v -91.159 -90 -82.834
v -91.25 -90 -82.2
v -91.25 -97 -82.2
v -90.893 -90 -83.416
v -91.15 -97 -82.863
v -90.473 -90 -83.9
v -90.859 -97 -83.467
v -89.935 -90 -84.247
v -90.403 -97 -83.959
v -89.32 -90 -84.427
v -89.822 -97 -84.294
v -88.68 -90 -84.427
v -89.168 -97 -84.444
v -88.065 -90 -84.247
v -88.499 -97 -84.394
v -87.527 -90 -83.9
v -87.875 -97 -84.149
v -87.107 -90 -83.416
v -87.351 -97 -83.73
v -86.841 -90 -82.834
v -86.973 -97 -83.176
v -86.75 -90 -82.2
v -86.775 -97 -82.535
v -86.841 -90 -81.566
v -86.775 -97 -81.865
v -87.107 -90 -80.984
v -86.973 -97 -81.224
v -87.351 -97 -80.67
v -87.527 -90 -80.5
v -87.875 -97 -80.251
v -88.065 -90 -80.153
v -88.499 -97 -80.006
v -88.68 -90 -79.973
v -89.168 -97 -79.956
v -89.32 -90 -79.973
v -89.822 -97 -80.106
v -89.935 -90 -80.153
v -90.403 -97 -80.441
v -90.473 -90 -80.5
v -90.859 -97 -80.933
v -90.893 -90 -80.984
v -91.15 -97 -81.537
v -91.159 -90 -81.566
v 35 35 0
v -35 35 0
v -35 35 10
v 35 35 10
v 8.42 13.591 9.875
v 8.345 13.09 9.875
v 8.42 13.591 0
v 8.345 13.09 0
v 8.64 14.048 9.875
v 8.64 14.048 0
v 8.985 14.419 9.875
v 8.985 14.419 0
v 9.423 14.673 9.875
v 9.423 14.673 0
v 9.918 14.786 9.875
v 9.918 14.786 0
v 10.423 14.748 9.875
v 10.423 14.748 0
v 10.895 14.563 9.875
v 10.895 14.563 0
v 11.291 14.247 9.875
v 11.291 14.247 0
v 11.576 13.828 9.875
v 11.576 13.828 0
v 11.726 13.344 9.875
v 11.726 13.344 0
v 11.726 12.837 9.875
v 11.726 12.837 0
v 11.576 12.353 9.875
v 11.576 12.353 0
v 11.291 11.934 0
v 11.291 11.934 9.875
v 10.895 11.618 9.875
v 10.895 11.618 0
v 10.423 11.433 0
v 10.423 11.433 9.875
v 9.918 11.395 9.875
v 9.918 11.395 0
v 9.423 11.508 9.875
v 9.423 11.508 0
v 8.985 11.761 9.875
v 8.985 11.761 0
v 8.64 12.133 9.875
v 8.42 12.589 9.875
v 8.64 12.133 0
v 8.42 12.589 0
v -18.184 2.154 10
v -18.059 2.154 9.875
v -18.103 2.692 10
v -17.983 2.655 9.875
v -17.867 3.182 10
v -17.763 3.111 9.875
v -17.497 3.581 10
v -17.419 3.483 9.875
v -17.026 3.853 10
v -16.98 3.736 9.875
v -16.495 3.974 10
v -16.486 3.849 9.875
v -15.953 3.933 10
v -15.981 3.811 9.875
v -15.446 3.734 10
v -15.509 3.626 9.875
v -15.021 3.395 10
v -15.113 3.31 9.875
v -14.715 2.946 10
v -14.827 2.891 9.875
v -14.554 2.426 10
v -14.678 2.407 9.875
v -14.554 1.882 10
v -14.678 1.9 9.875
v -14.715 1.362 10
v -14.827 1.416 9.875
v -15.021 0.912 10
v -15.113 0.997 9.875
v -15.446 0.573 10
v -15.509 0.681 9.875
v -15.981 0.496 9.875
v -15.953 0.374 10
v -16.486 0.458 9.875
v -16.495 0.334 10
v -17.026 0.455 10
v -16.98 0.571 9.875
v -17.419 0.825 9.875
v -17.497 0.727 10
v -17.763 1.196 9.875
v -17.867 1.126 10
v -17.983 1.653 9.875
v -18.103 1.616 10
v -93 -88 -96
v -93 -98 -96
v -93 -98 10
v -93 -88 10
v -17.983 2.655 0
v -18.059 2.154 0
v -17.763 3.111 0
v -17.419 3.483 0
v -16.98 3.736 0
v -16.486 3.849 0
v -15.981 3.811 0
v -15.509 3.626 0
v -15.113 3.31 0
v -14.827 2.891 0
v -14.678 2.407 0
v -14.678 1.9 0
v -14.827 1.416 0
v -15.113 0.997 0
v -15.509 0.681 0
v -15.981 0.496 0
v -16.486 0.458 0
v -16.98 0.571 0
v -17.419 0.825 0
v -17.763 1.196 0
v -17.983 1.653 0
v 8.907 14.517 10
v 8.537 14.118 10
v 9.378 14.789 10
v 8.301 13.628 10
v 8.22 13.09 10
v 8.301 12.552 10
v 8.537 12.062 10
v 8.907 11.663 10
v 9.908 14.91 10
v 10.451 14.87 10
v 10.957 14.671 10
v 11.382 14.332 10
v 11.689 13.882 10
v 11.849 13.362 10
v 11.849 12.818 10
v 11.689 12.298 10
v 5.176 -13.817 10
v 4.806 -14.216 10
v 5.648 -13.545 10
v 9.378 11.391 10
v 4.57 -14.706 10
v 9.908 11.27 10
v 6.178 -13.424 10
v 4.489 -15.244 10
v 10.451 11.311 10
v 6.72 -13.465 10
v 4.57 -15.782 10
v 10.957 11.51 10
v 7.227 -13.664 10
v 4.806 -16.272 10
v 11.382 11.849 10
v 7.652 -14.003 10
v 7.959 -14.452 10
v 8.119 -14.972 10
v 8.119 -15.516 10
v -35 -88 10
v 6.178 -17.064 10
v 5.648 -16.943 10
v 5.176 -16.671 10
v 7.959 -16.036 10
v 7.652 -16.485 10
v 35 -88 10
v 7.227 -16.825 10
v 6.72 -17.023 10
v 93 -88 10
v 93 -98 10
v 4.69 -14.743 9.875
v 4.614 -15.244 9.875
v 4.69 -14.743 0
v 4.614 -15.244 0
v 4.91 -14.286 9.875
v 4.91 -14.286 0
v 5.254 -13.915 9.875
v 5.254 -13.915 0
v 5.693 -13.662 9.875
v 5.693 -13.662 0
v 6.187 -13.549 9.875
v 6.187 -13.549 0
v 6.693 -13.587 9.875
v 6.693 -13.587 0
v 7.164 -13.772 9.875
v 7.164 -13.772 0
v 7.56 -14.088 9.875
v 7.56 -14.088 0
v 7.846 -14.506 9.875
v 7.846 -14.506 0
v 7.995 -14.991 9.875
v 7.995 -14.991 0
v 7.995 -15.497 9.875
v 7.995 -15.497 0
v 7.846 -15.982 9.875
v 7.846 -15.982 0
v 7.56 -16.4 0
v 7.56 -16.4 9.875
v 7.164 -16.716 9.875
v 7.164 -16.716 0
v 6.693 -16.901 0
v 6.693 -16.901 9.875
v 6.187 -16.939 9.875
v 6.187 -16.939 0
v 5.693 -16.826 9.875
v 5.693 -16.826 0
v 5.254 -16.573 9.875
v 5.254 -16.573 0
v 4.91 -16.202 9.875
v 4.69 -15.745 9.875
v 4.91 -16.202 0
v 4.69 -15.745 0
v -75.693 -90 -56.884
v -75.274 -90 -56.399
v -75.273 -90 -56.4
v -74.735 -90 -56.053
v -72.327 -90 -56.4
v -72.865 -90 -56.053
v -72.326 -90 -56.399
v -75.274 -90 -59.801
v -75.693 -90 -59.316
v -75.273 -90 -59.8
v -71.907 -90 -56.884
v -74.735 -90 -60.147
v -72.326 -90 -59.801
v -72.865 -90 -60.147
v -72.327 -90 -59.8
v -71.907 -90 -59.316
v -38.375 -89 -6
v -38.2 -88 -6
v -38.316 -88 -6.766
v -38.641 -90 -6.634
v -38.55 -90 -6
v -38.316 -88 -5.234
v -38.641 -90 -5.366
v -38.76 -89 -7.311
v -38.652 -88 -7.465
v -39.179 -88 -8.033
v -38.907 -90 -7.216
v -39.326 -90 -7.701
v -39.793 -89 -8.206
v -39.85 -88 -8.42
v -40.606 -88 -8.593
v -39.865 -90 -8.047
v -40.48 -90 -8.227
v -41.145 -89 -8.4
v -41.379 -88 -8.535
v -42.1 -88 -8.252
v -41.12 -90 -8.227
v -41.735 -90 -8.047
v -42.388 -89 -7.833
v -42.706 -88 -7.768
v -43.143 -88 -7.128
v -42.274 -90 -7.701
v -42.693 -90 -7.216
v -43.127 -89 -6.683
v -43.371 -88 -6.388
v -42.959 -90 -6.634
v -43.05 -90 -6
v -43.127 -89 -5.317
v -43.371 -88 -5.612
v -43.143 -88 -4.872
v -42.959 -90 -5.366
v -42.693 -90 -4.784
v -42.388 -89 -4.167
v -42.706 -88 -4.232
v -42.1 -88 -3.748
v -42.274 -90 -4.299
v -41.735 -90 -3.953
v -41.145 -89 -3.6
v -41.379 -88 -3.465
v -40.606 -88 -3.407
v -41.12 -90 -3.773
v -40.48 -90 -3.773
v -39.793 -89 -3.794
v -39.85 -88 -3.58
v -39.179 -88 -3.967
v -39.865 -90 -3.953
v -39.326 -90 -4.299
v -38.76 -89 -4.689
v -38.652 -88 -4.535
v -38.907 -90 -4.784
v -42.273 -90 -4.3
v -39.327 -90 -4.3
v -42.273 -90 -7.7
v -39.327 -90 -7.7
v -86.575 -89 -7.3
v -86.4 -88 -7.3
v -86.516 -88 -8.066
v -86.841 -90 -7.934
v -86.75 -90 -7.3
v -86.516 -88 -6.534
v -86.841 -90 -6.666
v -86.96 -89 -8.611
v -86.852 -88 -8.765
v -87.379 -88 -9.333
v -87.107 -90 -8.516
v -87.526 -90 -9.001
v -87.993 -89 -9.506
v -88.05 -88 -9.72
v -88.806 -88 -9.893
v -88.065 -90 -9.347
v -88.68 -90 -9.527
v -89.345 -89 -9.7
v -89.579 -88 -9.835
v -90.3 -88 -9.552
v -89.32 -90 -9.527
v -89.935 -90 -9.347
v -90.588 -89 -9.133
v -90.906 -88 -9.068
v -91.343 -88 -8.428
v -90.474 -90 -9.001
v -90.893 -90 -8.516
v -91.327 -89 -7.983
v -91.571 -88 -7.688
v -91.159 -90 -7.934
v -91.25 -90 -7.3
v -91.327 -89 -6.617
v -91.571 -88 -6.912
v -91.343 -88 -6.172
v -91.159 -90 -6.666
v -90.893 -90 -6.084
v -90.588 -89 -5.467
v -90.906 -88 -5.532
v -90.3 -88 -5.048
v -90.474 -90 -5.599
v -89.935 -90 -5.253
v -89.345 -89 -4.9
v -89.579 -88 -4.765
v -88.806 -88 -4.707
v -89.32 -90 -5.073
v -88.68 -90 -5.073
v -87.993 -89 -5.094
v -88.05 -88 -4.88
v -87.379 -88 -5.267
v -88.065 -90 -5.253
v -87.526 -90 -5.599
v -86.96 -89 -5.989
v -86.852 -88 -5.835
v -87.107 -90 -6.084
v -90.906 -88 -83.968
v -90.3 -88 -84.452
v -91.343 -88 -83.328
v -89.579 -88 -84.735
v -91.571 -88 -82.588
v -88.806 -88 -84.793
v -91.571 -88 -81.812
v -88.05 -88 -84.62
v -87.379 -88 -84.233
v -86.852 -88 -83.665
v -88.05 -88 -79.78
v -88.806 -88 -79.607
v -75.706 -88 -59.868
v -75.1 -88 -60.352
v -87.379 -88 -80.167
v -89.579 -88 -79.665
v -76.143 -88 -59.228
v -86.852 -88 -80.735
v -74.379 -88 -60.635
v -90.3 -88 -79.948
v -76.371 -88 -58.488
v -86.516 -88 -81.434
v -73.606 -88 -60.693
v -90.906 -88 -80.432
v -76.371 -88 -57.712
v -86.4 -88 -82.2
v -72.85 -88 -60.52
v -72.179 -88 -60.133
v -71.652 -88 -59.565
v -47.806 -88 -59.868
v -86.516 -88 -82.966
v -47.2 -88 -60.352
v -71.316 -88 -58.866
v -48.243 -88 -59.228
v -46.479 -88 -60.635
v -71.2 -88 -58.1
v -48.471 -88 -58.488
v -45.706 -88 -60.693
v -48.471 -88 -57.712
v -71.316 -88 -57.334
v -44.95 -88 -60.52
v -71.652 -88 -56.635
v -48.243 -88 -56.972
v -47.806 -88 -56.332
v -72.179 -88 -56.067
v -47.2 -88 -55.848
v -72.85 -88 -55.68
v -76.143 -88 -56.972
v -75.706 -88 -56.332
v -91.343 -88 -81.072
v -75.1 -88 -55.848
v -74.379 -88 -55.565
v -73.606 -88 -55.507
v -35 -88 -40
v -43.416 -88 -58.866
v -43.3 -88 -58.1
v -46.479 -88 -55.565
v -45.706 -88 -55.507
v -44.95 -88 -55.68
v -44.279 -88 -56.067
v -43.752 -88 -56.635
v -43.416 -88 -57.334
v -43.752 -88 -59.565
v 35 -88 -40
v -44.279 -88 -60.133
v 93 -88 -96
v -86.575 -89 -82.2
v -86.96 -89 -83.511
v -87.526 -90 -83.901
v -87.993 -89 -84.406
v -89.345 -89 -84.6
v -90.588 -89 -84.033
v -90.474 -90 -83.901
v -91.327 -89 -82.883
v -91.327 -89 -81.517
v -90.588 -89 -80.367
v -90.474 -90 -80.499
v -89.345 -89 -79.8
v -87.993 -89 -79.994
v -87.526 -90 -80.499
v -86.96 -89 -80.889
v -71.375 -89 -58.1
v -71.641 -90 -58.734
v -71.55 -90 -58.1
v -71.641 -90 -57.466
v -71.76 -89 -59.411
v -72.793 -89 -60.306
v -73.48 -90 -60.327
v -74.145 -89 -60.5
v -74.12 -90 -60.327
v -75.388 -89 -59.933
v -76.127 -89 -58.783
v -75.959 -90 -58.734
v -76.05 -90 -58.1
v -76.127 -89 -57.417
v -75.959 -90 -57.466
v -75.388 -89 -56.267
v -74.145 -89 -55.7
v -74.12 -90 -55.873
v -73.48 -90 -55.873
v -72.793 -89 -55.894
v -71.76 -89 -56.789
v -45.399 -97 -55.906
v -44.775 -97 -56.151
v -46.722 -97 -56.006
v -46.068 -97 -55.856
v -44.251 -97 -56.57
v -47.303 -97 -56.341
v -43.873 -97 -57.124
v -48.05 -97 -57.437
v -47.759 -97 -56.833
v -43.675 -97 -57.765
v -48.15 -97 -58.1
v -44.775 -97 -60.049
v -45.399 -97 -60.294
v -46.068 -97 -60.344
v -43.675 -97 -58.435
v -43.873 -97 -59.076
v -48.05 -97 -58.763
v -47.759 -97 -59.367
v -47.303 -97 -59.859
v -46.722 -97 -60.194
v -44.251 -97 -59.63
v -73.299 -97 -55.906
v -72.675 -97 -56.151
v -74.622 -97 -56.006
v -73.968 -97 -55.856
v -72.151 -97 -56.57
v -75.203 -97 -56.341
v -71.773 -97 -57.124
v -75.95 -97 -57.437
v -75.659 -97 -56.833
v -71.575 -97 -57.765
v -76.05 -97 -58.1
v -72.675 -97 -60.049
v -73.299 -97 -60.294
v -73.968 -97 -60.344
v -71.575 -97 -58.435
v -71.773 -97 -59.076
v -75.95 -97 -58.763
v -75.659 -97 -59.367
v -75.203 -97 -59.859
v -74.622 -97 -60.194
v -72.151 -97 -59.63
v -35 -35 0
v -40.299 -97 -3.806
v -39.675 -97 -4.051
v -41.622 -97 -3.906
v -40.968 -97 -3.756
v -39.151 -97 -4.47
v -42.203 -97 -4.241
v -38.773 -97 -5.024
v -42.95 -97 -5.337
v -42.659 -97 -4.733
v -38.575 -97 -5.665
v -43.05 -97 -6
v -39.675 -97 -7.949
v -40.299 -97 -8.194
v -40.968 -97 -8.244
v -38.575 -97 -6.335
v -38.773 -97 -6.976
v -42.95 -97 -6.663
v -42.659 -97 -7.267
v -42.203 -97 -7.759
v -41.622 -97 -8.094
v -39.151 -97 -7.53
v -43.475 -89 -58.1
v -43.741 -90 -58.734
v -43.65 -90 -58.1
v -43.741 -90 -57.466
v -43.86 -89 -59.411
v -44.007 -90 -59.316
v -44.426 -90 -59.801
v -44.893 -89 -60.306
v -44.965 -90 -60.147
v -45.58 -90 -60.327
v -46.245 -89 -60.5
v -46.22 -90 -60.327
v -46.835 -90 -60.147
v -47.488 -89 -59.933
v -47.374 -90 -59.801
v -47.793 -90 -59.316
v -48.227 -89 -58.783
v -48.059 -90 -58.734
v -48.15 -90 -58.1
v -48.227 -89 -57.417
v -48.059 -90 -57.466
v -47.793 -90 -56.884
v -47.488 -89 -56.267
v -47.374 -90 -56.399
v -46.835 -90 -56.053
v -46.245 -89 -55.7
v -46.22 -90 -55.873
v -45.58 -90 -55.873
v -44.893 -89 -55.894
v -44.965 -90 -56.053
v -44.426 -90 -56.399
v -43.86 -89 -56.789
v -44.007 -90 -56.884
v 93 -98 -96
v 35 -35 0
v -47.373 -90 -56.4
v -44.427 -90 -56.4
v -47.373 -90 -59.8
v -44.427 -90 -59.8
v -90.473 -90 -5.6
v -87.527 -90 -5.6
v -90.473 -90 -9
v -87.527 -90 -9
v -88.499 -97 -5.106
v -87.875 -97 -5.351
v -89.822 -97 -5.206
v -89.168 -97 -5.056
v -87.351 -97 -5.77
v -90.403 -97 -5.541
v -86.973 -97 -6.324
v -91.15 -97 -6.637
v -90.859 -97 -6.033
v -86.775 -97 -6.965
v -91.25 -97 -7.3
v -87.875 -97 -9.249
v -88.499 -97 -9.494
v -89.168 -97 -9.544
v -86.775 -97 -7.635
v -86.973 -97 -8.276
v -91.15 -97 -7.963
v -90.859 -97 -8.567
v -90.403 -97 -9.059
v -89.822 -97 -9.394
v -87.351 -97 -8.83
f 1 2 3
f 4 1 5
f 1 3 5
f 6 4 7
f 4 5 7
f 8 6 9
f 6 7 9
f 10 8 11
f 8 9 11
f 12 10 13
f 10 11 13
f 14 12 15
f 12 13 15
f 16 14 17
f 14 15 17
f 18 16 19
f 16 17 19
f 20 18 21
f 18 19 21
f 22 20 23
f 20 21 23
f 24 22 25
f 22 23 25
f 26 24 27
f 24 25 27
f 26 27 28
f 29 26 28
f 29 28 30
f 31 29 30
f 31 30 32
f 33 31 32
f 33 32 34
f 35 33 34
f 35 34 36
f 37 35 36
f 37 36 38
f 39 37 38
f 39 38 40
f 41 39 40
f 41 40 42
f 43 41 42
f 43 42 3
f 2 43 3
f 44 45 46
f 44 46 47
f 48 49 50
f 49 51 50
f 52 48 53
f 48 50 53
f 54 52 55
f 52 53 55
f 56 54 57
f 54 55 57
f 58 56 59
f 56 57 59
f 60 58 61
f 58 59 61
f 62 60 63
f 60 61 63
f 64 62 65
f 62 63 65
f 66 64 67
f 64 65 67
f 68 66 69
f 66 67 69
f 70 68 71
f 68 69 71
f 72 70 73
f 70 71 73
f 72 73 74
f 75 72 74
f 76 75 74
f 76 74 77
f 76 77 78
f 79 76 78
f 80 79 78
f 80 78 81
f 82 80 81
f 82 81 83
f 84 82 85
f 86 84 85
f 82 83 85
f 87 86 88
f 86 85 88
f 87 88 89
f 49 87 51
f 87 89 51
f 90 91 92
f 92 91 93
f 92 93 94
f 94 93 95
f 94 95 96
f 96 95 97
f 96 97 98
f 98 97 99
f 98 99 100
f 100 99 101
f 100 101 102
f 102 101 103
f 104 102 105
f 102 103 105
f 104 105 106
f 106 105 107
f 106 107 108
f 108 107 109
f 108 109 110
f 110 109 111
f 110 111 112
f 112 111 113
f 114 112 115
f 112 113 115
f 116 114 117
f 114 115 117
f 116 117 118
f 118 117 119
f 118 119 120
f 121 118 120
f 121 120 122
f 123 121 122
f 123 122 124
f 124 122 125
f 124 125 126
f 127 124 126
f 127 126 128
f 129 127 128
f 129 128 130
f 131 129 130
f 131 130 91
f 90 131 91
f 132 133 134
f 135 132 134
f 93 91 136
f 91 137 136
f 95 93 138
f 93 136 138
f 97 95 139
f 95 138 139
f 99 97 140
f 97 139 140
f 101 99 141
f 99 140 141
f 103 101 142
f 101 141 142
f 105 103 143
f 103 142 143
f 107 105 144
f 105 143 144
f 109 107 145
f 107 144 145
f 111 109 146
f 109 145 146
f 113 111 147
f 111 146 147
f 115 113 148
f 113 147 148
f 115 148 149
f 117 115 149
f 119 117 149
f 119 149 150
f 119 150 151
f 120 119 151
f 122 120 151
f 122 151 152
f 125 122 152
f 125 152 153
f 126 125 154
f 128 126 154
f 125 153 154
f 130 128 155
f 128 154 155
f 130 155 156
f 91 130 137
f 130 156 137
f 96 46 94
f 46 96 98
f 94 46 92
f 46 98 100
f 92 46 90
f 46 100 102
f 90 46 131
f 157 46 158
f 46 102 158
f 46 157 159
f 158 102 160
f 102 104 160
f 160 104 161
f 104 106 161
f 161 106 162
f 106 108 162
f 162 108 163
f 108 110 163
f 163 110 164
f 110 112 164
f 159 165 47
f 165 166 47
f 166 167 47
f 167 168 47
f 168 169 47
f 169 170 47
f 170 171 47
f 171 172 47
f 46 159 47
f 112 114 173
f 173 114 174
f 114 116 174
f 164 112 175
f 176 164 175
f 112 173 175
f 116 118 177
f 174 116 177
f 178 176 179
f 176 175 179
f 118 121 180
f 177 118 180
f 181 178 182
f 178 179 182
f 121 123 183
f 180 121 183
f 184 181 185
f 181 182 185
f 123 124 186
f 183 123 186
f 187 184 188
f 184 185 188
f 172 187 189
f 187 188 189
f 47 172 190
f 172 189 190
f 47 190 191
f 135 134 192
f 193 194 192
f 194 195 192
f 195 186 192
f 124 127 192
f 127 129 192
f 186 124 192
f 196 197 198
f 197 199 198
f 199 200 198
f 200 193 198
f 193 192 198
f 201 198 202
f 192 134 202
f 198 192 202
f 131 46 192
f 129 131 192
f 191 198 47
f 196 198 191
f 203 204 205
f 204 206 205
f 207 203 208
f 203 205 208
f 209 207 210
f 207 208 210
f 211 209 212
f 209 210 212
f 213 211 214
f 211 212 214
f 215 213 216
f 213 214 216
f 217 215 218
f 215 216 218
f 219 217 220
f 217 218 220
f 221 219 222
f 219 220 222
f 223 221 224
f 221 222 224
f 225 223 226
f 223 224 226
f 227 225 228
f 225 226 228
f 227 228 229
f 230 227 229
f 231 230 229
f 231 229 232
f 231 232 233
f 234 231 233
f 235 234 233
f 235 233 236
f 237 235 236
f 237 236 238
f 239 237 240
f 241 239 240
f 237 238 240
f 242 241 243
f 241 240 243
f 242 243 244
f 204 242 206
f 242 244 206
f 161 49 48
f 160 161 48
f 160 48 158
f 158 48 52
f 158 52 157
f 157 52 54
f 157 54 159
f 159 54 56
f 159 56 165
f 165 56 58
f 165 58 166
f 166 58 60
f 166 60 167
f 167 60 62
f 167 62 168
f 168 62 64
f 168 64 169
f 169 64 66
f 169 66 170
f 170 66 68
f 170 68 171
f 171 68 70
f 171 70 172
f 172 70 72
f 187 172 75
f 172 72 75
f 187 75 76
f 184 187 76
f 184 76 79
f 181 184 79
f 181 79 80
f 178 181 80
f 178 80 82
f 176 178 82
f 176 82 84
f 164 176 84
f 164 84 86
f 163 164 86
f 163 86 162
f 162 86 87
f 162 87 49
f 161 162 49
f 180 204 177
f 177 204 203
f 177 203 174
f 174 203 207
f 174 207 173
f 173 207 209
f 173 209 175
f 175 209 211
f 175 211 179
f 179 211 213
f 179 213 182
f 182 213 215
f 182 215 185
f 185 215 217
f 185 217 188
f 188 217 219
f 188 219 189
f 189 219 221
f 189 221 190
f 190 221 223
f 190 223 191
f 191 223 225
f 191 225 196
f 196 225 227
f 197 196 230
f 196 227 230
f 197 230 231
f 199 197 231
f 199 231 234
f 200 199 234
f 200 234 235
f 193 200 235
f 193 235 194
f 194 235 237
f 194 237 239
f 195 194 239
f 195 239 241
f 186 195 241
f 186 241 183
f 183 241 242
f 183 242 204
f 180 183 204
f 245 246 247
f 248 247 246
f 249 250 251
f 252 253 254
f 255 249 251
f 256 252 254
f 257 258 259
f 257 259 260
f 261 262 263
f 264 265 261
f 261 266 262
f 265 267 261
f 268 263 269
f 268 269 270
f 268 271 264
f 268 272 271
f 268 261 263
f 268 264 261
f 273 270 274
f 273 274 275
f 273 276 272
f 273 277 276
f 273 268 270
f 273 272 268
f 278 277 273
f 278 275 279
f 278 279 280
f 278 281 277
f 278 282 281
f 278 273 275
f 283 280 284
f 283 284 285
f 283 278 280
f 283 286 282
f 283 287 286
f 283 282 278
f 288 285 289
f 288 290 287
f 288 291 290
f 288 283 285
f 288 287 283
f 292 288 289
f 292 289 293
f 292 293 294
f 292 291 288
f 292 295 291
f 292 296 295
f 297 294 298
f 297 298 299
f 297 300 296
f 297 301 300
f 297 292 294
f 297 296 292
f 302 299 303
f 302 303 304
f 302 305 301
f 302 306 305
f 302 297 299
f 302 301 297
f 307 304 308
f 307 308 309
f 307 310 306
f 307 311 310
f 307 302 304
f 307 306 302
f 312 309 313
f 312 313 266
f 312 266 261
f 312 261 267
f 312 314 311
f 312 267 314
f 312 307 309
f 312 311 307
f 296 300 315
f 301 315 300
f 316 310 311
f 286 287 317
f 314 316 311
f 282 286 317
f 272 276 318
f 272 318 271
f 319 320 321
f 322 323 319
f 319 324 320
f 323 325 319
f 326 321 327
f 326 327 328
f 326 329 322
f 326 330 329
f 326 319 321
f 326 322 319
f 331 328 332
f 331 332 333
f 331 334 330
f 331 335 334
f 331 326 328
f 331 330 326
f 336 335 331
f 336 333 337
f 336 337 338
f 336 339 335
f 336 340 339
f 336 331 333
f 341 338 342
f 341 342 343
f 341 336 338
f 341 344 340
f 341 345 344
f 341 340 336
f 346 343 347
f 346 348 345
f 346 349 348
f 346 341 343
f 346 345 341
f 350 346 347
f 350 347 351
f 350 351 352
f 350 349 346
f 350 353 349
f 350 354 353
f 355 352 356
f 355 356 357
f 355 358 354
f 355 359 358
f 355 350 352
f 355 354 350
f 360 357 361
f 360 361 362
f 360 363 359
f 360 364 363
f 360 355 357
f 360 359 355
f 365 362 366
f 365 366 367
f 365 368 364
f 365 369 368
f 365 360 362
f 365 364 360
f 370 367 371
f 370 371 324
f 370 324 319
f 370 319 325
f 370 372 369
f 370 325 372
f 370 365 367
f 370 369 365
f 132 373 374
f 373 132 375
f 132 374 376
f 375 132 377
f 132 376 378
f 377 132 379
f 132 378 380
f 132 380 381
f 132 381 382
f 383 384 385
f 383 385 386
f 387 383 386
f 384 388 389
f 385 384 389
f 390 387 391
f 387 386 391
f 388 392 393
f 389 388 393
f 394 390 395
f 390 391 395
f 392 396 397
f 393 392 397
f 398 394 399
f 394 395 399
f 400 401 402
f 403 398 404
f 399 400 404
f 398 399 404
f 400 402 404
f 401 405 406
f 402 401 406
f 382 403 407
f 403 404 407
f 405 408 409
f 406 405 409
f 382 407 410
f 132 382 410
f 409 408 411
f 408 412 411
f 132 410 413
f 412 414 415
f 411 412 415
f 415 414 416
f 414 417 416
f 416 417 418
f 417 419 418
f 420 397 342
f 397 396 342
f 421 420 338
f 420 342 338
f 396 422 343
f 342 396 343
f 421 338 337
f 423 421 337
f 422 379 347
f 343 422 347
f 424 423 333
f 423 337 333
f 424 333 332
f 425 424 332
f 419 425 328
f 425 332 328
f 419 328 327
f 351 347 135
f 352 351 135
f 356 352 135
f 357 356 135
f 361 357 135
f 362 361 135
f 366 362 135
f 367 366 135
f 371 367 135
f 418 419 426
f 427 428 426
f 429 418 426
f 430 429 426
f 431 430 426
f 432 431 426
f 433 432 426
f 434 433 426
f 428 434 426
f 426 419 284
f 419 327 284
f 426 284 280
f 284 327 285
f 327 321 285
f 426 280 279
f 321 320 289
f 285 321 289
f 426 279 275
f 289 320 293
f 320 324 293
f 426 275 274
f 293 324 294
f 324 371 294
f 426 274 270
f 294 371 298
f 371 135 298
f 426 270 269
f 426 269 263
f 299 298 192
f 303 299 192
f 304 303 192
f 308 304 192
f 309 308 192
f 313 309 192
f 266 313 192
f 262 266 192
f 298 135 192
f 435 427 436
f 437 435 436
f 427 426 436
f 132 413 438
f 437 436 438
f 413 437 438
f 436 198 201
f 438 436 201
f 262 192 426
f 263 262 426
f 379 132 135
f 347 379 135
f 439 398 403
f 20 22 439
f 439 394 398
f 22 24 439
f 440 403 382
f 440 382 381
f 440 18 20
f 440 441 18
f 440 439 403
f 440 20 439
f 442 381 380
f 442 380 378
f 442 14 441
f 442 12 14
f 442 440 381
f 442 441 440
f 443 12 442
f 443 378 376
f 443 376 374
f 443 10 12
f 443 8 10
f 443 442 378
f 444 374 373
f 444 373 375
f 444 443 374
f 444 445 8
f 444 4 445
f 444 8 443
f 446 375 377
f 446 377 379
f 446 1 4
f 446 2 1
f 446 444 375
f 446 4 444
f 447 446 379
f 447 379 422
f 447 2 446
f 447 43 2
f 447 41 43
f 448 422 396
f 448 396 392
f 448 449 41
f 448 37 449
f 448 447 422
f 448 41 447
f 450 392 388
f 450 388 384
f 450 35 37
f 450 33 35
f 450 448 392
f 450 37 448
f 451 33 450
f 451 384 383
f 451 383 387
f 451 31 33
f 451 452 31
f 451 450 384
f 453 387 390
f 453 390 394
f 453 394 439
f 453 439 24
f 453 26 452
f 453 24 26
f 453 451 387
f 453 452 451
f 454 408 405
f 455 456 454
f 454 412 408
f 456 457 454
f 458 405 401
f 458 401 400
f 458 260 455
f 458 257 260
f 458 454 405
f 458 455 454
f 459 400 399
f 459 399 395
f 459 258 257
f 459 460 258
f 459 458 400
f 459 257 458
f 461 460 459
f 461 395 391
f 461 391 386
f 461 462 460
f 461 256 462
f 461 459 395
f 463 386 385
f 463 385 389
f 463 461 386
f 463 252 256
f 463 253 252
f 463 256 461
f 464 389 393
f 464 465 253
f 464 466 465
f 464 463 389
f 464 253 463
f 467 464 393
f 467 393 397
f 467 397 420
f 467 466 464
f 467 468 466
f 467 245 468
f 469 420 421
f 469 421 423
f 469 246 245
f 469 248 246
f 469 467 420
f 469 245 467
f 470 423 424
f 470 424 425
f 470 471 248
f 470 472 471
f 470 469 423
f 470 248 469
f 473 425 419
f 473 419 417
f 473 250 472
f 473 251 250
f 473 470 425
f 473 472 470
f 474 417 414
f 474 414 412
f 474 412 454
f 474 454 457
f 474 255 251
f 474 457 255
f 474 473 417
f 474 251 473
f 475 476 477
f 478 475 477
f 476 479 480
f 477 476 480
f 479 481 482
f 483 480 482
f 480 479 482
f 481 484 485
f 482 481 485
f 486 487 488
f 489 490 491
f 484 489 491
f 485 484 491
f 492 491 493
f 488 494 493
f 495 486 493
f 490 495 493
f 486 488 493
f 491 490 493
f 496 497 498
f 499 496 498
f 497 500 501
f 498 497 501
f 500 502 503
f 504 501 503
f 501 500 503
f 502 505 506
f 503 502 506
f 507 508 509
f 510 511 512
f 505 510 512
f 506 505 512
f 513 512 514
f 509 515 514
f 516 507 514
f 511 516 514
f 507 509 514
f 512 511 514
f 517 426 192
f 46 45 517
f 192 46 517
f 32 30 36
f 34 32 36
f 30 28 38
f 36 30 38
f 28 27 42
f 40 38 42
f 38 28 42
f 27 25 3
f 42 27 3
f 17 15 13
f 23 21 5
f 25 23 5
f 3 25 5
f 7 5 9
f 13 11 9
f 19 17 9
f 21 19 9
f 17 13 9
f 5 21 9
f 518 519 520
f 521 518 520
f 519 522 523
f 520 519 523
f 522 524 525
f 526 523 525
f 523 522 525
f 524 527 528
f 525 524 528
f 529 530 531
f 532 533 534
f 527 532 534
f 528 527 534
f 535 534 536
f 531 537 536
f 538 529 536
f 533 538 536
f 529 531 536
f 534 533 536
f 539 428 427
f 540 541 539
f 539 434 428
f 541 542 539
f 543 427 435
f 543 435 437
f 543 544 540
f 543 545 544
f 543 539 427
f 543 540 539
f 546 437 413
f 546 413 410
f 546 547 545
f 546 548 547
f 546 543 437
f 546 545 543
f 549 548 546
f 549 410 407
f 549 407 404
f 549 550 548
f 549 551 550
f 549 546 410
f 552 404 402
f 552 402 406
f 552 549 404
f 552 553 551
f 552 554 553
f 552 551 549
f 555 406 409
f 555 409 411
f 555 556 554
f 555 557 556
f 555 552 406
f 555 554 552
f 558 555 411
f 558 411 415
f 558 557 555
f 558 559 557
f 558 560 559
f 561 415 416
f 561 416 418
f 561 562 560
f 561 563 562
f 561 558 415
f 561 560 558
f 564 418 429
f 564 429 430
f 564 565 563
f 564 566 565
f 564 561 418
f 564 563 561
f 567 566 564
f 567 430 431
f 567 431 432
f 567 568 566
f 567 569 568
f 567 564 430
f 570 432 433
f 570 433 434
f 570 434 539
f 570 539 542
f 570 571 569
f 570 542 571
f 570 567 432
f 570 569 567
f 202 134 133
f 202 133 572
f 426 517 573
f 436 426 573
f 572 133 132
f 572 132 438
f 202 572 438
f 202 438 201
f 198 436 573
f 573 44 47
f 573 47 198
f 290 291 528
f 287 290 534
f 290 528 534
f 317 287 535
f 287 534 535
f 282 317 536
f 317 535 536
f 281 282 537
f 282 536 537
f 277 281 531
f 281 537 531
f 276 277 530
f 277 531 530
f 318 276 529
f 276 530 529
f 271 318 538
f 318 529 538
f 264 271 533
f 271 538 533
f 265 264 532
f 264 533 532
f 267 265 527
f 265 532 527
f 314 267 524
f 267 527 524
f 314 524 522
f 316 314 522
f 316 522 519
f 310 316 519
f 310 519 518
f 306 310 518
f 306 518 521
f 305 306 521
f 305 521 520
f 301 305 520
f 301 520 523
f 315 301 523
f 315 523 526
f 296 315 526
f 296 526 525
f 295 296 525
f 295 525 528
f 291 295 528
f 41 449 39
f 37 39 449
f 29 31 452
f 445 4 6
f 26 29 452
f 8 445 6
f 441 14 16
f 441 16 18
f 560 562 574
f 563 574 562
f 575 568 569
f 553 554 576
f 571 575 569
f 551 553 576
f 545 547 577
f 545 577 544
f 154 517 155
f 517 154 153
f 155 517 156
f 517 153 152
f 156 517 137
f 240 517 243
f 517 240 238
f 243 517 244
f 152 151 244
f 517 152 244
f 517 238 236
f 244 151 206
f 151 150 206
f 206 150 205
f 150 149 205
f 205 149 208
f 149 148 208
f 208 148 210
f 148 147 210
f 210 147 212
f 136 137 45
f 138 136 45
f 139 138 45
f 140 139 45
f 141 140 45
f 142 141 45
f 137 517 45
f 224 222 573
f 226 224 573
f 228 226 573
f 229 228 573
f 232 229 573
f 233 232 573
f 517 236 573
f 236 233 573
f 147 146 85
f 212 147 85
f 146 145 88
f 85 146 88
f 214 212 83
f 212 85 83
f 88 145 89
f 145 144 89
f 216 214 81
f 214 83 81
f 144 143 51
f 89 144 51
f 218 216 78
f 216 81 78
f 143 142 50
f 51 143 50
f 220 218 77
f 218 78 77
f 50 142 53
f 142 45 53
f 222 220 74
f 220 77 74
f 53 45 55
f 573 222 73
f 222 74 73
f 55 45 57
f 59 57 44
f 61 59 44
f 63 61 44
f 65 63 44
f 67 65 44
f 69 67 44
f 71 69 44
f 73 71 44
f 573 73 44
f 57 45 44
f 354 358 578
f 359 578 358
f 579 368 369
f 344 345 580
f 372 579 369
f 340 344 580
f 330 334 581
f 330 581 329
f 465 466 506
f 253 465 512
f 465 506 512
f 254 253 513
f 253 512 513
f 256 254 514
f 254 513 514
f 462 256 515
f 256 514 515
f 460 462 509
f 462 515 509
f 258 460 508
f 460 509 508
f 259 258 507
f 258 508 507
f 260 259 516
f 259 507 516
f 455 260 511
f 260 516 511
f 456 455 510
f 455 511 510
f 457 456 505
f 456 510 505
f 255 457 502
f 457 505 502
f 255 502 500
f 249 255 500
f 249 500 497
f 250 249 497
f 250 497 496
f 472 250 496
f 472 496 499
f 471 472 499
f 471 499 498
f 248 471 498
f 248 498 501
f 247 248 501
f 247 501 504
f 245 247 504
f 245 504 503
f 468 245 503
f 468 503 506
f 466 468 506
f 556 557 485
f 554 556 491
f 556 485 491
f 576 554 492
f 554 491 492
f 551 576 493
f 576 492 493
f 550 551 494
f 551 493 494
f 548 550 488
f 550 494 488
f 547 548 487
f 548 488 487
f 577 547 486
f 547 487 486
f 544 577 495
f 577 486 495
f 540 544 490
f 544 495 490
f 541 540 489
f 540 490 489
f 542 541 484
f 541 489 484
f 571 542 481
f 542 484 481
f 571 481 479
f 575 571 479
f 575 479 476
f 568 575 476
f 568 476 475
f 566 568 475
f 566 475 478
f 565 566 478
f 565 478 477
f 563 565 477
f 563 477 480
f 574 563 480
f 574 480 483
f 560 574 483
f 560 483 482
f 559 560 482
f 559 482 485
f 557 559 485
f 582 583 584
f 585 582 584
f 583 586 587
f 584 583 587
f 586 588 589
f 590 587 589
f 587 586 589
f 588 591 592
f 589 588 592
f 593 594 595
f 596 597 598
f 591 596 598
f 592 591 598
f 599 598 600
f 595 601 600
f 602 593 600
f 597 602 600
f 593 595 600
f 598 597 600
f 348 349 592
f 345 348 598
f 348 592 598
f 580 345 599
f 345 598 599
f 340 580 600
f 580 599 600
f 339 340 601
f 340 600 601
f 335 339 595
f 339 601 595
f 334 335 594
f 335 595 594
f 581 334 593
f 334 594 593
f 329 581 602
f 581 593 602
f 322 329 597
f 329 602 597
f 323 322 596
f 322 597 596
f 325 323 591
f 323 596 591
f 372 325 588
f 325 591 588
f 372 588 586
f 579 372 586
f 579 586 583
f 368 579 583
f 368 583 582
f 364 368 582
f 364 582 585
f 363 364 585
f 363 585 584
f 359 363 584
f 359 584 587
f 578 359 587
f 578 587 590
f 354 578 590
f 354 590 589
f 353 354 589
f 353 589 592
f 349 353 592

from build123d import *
from OCP.BRepFilletAPI import BRepFilletAPI_MakeChamfer

# Parameters (mm, degrees)
SKETCH1_W                      = 70
SKETCH1_H                      = 70
BOSS_EXTRUDE1_DEPTH            = 10
M3_CLEARANCE_HOLE1_D           = 3.4
M3_CLEARANCE_HOLE1_CSINK_D     = 3.65
M3_CLEARANCE_HOLE1_CSINK_ANGLE = 90
SKETCH14_W                     = 70
SKETCH14_H                     = 10
BOSS_EXTRUDE2_DEPTH            = 63
SKETCH13_W                     = 186
SKETCH13_H                     = 106
BOSS_EXTRUDE3_DEPTH            = 10
CHAMFER1_SIZE                  = 40
CHAMFER1_SIZE2                 = 53
HOLE1_D                        = 4.5
HOLE1_DEPTH                    = 9
HOLE1_CBORE_D                  = 5.2
HOLE1_CBORE_DEPTH              = 2
CHAMFER2_SIZE                  = 2
CHAMFER2_SIZE_2                = 0.35


with BuildPart() as part:
    # Sketch1 → Boss-Extrude1 (new body)
    with BuildSketch(Plane.XY):
        Rectangle(SKETCH1_W, SKETCH1_H)
    extrude(amount=BOSS_EXTRUDE1_DEPTH)

    # M3 Clearance Hole1 (through all)
    with Locations(Plane.XY.offset(10)):
        with Locations((6.314276634, -15.244012286), (10.044563579, 13.090330115), (-16.358840213, 2.153682172)):
            CounterSinkHole(M3_CLEARANCE_HOLE1_D / 2, M3_CLEARANCE_HOLE1_CSINK_D / 2, counter_sink_angle=M3_CLEARANCE_HOLE1_CSINK_ANGLE)

    # Sketch14 → Boss-Extrude2 (add)
    with BuildSketch(Plane.XZ.offset(35)):
        with Locations((0, 5)):
            Rectangle(SKETCH14_W, SKETCH14_H)
    extrude(amount=BOSS_EXTRUDE2_DEPTH)

    # Sketch13 → Boss-Extrude3 (add)
    with BuildSketch(Plane.XZ.offset(98)):
        with Locations((0, -43)):
            Rectangle(SKETCH13_W, SKETCH13_H)
    extrude(amount=-BOSS_EXTRUDE3_DEPTH)

    # Chamfer1
    chamfer1_edges = [part.edges().sort_by_distance(p)[0] for p in [
        (0, -88, 0),
    ]]
    chamfer1_side = [part.faces().sort_by_distance(p)[0] for p in [
        (0, -88, -44.766933109),
    ]]
    chamfer(chamfer1_edges, length=CHAMFER1_SIZE, length2=CHAMFER1_SIZE2, reference=chamfer1_side[0])

    # Hole1
    with Locations(Plane(origin=(0, -88, 0), x_dir=(1, 0, 0), z_dir=(0, 1, 0))):
        with Locations((-89, 7.3), (-89, 82.2), (-40.8, 6), (-73.8, 58.1), (-45.9, 58.1)):
            CounterBoreHole(HOLE1_D / 2, HOLE1_CBORE_D / 2, HOLE1_CBORE_DEPTH, depth=HOLE1_DEPTH)

    # Chamfer2
    chamfer2_edges_1 = [part.edges().sort_by_distance(p)[0] for p in [
        (-43.4, -90, -6),
    ]]
    chamfer2_side_1 = [part.faces().sort_by_distance(p)[0] for p in [
        (-43.4, -89.993, -6),
    ]]
    chamfer2_edges_2 = [part.edges().sort_by_distance(p)[0] for p in [
        (-91.6, -90, -82.2),
    ]]
    chamfer2_side_2 = [part.faces().sort_by_distance(p)[0] for p in [
        (-91.6, -89.993, -82.2),
    ]]
    chamfer2_edges_3 = [part.edges().sort_by_distance(p)[0] for p in [
        (-91.6, -90, -7.3),
    ]]
    chamfer2_side_3 = [part.faces().sort_by_distance(p)[0] for p in [
        (-91.6, -89.993, -7.3),
    ]]
    chamfer2_edges_4 = [part.edges().sort_by_distance(p)[0] for p in [
        (-48.5, -90, -58.1),
    ]]
    chamfer2_side_4 = [part.faces().sort_by_distance(p)[0] for p in [
        (-48.5, -89.993, -58.1),
    ]]
    chamfer2_edges_5 = [part.edges().sort_by_distance(p)[0] for p in [
        (-76.4, -90, -58.1),
    ]]
    chamfer2_side_5 = [part.faces().sort_by_distance(p)[0] for p in [
        (-76.4, -89.993, -58.1),
    ]]
    chamfer2 = BRepFilletAPI_MakeChamfer(part.part.solid().wrapped)
    for e in chamfer2_edges_1:
        chamfer2.Add(CHAMFER2_SIZE - 0.0001, CHAMFER2_SIZE_2 - 0.0001, e.wrapped, chamfer2_side_1[0].wrapped)
    for e in chamfer2_edges_2:
        chamfer2.Add(CHAMFER2_SIZE - 0.0001, CHAMFER2_SIZE_2 - 0.0001, e.wrapped, chamfer2_side_2[0].wrapped)
    for e in chamfer2_edges_3:
        chamfer2.Add(CHAMFER2_SIZE - 0.0001, CHAMFER2_SIZE_2 - 0.0001, e.wrapped, chamfer2_side_3[0].wrapped)
    for e in chamfer2_edges_4:
        chamfer2.Add(CHAMFER2_SIZE - 0.0001, CHAMFER2_SIZE_2 - 0.0001, e.wrapped, chamfer2_side_4[0].wrapped)
    for e in chamfer2_edges_5:
        chamfer2.Add(CHAMFER2_SIZE - 0.0001, CHAMFER2_SIZE_2 - 0.0001, e.wrapped, chamfer2_side_5[0].wrapped)
    add(Compound.cast(chamfer2.Shape()), mode=Mode.REPLACE)  # a hair under: the kernel refuses the full size


solid = part.part
